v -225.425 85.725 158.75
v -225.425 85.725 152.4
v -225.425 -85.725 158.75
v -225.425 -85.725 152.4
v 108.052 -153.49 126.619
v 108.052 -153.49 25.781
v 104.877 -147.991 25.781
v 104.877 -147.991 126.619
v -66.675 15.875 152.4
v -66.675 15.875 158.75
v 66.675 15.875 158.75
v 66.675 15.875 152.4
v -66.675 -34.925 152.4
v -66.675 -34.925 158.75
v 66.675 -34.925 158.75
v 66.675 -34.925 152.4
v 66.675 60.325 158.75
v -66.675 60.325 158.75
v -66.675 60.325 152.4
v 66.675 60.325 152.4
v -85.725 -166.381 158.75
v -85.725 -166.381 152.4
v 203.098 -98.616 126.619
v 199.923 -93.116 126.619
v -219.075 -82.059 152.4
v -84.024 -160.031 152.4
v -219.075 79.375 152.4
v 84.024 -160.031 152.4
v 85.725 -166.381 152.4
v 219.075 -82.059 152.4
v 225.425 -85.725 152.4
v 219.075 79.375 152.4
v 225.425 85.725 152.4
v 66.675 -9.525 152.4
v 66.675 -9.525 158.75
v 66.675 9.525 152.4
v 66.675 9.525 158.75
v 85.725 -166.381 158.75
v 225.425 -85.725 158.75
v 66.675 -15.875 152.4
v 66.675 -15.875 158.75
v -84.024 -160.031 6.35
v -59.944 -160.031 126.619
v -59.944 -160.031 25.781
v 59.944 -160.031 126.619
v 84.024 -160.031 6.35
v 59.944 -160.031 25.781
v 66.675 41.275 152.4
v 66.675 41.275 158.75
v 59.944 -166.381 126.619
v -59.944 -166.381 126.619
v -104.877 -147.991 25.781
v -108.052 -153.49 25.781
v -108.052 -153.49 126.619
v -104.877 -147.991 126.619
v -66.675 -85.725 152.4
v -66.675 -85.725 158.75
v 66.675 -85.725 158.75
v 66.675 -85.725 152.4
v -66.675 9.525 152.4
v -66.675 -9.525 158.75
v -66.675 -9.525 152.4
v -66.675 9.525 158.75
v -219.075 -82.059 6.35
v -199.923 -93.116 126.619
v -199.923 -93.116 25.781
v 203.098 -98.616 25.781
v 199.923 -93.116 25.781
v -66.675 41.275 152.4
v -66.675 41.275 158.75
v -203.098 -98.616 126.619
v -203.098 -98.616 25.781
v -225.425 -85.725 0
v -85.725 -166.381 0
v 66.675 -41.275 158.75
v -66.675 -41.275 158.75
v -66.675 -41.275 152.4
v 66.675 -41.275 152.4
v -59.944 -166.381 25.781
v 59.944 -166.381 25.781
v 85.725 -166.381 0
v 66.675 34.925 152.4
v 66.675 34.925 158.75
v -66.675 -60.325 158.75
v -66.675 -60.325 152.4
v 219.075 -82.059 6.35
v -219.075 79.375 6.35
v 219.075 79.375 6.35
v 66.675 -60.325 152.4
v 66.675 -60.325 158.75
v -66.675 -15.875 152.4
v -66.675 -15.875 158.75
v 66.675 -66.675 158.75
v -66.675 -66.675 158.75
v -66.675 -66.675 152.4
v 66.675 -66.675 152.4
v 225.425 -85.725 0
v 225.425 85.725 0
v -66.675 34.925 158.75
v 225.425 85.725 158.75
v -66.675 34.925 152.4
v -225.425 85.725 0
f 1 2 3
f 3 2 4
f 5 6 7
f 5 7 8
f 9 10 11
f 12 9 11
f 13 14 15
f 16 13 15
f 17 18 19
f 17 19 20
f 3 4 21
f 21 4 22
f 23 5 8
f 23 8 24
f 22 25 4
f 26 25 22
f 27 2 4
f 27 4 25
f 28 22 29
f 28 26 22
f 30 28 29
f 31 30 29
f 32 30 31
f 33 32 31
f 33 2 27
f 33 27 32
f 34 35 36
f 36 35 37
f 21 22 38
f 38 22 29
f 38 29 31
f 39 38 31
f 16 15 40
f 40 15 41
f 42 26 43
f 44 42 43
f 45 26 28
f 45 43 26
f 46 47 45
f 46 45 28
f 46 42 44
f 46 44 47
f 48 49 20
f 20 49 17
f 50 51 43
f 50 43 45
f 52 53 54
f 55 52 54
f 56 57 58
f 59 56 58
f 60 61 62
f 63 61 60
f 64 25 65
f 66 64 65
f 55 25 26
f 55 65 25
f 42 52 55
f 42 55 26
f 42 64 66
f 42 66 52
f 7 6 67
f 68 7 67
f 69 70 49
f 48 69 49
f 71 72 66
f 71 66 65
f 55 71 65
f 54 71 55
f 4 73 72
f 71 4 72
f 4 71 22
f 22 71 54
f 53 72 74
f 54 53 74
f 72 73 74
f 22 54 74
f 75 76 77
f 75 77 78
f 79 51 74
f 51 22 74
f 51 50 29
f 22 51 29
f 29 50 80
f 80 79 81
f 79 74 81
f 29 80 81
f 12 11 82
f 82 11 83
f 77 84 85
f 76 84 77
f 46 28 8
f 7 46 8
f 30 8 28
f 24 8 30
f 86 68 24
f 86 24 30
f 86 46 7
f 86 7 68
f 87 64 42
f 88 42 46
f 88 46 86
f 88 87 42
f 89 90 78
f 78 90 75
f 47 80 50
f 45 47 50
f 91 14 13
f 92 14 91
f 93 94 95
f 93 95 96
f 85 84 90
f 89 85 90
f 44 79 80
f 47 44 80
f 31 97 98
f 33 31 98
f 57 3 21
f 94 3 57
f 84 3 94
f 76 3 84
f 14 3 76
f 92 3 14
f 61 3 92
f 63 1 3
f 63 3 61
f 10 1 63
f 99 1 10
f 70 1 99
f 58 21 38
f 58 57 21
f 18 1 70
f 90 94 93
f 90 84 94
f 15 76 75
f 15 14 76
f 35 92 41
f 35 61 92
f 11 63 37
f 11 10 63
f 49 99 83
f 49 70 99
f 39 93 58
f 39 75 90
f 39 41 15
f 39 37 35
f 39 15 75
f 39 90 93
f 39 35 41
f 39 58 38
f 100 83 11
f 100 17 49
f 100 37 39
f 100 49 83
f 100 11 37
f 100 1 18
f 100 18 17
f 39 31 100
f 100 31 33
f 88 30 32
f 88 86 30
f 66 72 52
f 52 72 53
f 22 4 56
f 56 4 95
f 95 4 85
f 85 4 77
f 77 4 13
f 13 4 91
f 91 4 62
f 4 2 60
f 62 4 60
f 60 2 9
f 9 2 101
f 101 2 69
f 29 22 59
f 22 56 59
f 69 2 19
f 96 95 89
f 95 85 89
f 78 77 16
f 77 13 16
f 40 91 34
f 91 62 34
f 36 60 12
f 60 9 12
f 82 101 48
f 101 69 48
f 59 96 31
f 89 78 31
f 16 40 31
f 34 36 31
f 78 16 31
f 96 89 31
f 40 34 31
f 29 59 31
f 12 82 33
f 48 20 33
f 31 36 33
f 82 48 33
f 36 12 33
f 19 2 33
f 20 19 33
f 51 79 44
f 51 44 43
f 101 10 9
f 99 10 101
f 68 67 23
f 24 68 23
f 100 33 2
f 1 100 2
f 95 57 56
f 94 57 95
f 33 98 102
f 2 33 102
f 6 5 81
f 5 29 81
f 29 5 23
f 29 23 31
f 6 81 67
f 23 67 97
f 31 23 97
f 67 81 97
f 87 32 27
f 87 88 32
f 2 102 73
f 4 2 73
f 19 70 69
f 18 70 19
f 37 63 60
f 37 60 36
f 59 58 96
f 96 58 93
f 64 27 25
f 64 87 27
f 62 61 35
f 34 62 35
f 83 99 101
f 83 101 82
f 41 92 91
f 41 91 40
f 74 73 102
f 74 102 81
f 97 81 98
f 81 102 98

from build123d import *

# Parameters (mm, degrees)
F1_DEPTH  = 152.4
F3_T      = -6.35
F2_W      = 119.888
F2_H      = 100.838
F4_DEPTH  = 25.4
F6_DEPTH  = 6.35
F7_W      = 133.35
F7_H      = 19.05
F8_DEPTH  = 25.4
F9_W      = 109.7496652116
F9_H      = 100.838
F10_DEPTH = 25.4
F11_W     = 109.7496652116
F11_H     = 100.838
F12_DEPTH = 25.4


with BuildPart() as f1:
    # F0 (on Top) → F1 (new body)
    with BuildSketch(Plane.XY):
        Polygon((225.425, 85.725), (-225.425, 85.725), (-225.425, -85.725), (-85.725, -166.3808326058), (85.725, -166.3808326058), (225.425, -85.725), align=None)
    extrude(amount=F1_DEPTH)

    # F3
    f3_openings = [f1.faces().sort_by_distance(p)[0] for p in [
        (0, -29.415362, 152.4),
    ]]
    offset(amount=F3_T, openings=f3_openings)

    # F2 (on face) → F4 (cut)
    with BuildSketch(Plane.XZ.offset(166.3808326058)):
        with Locations((0, 76.2)):
            Rectangle(F2_W, F2_H)
    extrude(amount=-F4_DEPTH, mode=Mode.SUBTRACT)

    # F9 (on face) → F10 (cut)
    with BuildSketch(Plane(origin=(93.4762638697, -161.9056383241, 0), x_dir=(0.8660254038, 0.5, 0), z_dir=(0.5, -0.8660254038, 0))):
        with Locations((71.7054440423, 76.2)):
            Rectangle(F9_W, F9_H)
    extrude(amount=-F10_DEPTH, mode=Mode.SUBTRACT)

    # F11 (on face) → F12 (cut)
    with BuildSketch(Plane(origin=(-93.4762638697, -161.9056383241, 0), x_dir=(0.8660254038, -0.5, 0), z_dir=(-0.5, -0.8660254038, 0))):
        with Locations((-71.7054440423, 76.2)):
            Rectangle(F11_W, F11_H)
    extrude(amount=-F12_DEPTH, mode=Mode.SUBTRACT)


with BuildPart() as f6:
    # F5 (on face) → F6 (new body)
    with BuildSketch(Plane.XY.offset(152.4)):
        Polygon((-225.425, -85.725), (-85.725, -166.3808326058), (85.725, -166.3808326058), (225.425, -85.725), (225.425, 85.725), (-225.425, 85.725), align=None)
    extrude(amount=F6_DEPTH)

    # F7 (on face) → F8 (cut)
    with BuildSketch(Plane.XY.offset(158.75)):
        Rectangle(F7_W, F7_H)
        with Locations((0, -25.4)):
            Rectangle(F7_W, F7_H)
        with Locations((0, -50.8)):
            Rectangle(F7_W, F7_H)
        with Locations((0, 25.4)):
            Rectangle(F7_W, F7_H)
        with Locations((0, 50.8)):
            Rectangle(F7_W, F7_H)
        with Locations((0, -76.2)):
            Rectangle(F7_W, F7_H)
    extrude(amount=-F8_DEPTH, mode=Mode.SUBTRACT)


solid = Compound([f1.part, f6.part])
